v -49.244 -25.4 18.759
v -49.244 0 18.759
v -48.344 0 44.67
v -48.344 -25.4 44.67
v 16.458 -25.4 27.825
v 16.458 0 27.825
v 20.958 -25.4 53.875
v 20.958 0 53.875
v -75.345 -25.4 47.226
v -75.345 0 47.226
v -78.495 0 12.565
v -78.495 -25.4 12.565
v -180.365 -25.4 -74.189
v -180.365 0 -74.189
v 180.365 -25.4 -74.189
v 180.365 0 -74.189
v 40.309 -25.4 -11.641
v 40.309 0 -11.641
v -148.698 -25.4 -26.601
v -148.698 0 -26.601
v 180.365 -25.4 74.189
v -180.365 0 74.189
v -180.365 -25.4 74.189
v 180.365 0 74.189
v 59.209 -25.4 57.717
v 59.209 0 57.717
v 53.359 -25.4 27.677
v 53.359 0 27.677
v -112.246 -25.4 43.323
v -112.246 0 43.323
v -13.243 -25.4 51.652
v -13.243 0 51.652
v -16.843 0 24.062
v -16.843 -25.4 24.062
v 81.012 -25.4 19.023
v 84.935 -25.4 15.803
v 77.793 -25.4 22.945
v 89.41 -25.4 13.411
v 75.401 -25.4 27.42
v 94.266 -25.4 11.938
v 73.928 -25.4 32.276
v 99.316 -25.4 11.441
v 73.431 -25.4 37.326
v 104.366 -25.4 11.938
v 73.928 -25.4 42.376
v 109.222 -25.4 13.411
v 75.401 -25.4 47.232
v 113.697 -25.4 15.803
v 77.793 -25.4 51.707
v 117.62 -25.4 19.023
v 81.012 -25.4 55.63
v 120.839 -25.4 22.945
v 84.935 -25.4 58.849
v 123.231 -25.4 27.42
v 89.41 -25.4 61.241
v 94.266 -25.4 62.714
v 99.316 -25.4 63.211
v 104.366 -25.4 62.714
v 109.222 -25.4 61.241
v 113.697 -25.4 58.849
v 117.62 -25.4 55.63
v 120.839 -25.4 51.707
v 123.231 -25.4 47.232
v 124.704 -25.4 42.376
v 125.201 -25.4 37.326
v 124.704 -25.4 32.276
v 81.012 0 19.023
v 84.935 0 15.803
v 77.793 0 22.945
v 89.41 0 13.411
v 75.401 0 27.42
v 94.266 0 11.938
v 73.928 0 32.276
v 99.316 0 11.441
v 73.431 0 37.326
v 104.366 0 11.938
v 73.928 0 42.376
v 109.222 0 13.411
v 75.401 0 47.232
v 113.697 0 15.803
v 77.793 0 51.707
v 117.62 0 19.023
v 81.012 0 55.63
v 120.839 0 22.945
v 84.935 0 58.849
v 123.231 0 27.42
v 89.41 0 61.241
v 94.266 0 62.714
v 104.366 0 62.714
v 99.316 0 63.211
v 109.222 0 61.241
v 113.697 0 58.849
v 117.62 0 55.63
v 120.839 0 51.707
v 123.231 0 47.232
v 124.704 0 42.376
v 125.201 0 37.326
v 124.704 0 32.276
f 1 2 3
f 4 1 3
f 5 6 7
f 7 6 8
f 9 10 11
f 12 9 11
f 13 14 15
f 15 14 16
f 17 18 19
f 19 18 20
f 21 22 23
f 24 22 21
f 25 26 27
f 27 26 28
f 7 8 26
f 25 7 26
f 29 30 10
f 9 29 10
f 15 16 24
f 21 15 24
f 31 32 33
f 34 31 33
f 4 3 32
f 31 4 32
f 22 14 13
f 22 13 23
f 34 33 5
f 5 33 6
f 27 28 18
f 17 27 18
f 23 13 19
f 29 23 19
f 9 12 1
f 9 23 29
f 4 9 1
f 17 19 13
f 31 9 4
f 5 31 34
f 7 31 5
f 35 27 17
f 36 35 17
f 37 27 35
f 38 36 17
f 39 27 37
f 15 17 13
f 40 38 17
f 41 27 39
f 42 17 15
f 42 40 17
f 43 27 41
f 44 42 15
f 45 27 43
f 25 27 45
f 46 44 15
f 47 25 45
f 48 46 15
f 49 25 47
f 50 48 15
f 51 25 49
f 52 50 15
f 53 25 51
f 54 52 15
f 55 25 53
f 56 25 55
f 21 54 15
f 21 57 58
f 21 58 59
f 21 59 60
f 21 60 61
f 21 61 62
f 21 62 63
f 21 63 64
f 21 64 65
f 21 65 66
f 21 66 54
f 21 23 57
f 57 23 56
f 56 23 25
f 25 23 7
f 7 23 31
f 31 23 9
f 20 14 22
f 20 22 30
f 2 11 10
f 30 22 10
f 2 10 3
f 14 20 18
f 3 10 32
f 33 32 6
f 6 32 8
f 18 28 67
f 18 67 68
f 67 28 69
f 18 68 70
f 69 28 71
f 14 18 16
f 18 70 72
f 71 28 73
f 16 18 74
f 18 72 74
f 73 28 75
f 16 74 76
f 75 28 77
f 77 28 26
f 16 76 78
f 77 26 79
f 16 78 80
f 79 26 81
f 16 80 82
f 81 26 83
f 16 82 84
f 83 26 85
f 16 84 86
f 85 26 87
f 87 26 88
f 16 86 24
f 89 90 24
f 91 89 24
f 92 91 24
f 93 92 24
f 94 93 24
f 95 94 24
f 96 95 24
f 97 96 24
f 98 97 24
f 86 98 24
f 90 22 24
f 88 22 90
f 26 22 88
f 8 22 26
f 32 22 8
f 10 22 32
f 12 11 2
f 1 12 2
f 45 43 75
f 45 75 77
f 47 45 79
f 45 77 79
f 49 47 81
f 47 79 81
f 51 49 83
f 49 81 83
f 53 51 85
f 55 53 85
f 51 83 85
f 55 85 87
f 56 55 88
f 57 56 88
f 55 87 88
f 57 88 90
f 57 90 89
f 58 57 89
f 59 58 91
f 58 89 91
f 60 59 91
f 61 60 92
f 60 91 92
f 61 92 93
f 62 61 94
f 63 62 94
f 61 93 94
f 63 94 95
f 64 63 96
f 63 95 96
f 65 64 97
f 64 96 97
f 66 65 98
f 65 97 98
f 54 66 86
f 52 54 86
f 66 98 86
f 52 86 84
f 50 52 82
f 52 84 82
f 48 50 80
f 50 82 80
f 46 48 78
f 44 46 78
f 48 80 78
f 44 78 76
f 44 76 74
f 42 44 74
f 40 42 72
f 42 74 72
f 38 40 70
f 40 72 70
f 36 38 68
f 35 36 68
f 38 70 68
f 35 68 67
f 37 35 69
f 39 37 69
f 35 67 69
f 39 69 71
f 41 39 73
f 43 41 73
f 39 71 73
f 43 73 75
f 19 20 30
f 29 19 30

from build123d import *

# Parameters (mm, degrees)
F0_W     = 360.729664
F0_H     = 148.37706
F1_DEPTH = 25.4
F2_R     = 25.885086
F3_DEPTH = 25.4


with BuildPart() as f1:
    # F0 (on Front) → F1 (new body)
    with BuildSketch(Plane.XZ):
        Rectangle(F0_W, F0_H)
        Polygon((-148.697704, -26.601247), (-112.246476, 43.323327), (-75.345226, 47.225576), (-78.495331, 12.56507), (-49.244333, 18.759031), (-48.344307, 44.669721), (-13.243117, 51.652454), (-16.843244, 24.062283), (16.457889, 27.825298), (20.958038, 53.875219), (59.209336, 57.717167), (53.35914, 27.677407), (40.308692, -11.641144), align=None, mode=Mode.SUBTRACT)
    extrude(amount=F1_DEPTH)

    # F2 (on face) → F3 (cut)
    with BuildSketch(Plane(origin=(0, 0, 0), x_dir=(-1, 0, 0), z_dir=(0, 1, 0))):
        with Locations((-99.316008, 37.326083)):
            Circle(F2_R)
    extrude(amount=-F3_DEPTH, mode=Mode.SUBTRACT)


solid = f1.part
